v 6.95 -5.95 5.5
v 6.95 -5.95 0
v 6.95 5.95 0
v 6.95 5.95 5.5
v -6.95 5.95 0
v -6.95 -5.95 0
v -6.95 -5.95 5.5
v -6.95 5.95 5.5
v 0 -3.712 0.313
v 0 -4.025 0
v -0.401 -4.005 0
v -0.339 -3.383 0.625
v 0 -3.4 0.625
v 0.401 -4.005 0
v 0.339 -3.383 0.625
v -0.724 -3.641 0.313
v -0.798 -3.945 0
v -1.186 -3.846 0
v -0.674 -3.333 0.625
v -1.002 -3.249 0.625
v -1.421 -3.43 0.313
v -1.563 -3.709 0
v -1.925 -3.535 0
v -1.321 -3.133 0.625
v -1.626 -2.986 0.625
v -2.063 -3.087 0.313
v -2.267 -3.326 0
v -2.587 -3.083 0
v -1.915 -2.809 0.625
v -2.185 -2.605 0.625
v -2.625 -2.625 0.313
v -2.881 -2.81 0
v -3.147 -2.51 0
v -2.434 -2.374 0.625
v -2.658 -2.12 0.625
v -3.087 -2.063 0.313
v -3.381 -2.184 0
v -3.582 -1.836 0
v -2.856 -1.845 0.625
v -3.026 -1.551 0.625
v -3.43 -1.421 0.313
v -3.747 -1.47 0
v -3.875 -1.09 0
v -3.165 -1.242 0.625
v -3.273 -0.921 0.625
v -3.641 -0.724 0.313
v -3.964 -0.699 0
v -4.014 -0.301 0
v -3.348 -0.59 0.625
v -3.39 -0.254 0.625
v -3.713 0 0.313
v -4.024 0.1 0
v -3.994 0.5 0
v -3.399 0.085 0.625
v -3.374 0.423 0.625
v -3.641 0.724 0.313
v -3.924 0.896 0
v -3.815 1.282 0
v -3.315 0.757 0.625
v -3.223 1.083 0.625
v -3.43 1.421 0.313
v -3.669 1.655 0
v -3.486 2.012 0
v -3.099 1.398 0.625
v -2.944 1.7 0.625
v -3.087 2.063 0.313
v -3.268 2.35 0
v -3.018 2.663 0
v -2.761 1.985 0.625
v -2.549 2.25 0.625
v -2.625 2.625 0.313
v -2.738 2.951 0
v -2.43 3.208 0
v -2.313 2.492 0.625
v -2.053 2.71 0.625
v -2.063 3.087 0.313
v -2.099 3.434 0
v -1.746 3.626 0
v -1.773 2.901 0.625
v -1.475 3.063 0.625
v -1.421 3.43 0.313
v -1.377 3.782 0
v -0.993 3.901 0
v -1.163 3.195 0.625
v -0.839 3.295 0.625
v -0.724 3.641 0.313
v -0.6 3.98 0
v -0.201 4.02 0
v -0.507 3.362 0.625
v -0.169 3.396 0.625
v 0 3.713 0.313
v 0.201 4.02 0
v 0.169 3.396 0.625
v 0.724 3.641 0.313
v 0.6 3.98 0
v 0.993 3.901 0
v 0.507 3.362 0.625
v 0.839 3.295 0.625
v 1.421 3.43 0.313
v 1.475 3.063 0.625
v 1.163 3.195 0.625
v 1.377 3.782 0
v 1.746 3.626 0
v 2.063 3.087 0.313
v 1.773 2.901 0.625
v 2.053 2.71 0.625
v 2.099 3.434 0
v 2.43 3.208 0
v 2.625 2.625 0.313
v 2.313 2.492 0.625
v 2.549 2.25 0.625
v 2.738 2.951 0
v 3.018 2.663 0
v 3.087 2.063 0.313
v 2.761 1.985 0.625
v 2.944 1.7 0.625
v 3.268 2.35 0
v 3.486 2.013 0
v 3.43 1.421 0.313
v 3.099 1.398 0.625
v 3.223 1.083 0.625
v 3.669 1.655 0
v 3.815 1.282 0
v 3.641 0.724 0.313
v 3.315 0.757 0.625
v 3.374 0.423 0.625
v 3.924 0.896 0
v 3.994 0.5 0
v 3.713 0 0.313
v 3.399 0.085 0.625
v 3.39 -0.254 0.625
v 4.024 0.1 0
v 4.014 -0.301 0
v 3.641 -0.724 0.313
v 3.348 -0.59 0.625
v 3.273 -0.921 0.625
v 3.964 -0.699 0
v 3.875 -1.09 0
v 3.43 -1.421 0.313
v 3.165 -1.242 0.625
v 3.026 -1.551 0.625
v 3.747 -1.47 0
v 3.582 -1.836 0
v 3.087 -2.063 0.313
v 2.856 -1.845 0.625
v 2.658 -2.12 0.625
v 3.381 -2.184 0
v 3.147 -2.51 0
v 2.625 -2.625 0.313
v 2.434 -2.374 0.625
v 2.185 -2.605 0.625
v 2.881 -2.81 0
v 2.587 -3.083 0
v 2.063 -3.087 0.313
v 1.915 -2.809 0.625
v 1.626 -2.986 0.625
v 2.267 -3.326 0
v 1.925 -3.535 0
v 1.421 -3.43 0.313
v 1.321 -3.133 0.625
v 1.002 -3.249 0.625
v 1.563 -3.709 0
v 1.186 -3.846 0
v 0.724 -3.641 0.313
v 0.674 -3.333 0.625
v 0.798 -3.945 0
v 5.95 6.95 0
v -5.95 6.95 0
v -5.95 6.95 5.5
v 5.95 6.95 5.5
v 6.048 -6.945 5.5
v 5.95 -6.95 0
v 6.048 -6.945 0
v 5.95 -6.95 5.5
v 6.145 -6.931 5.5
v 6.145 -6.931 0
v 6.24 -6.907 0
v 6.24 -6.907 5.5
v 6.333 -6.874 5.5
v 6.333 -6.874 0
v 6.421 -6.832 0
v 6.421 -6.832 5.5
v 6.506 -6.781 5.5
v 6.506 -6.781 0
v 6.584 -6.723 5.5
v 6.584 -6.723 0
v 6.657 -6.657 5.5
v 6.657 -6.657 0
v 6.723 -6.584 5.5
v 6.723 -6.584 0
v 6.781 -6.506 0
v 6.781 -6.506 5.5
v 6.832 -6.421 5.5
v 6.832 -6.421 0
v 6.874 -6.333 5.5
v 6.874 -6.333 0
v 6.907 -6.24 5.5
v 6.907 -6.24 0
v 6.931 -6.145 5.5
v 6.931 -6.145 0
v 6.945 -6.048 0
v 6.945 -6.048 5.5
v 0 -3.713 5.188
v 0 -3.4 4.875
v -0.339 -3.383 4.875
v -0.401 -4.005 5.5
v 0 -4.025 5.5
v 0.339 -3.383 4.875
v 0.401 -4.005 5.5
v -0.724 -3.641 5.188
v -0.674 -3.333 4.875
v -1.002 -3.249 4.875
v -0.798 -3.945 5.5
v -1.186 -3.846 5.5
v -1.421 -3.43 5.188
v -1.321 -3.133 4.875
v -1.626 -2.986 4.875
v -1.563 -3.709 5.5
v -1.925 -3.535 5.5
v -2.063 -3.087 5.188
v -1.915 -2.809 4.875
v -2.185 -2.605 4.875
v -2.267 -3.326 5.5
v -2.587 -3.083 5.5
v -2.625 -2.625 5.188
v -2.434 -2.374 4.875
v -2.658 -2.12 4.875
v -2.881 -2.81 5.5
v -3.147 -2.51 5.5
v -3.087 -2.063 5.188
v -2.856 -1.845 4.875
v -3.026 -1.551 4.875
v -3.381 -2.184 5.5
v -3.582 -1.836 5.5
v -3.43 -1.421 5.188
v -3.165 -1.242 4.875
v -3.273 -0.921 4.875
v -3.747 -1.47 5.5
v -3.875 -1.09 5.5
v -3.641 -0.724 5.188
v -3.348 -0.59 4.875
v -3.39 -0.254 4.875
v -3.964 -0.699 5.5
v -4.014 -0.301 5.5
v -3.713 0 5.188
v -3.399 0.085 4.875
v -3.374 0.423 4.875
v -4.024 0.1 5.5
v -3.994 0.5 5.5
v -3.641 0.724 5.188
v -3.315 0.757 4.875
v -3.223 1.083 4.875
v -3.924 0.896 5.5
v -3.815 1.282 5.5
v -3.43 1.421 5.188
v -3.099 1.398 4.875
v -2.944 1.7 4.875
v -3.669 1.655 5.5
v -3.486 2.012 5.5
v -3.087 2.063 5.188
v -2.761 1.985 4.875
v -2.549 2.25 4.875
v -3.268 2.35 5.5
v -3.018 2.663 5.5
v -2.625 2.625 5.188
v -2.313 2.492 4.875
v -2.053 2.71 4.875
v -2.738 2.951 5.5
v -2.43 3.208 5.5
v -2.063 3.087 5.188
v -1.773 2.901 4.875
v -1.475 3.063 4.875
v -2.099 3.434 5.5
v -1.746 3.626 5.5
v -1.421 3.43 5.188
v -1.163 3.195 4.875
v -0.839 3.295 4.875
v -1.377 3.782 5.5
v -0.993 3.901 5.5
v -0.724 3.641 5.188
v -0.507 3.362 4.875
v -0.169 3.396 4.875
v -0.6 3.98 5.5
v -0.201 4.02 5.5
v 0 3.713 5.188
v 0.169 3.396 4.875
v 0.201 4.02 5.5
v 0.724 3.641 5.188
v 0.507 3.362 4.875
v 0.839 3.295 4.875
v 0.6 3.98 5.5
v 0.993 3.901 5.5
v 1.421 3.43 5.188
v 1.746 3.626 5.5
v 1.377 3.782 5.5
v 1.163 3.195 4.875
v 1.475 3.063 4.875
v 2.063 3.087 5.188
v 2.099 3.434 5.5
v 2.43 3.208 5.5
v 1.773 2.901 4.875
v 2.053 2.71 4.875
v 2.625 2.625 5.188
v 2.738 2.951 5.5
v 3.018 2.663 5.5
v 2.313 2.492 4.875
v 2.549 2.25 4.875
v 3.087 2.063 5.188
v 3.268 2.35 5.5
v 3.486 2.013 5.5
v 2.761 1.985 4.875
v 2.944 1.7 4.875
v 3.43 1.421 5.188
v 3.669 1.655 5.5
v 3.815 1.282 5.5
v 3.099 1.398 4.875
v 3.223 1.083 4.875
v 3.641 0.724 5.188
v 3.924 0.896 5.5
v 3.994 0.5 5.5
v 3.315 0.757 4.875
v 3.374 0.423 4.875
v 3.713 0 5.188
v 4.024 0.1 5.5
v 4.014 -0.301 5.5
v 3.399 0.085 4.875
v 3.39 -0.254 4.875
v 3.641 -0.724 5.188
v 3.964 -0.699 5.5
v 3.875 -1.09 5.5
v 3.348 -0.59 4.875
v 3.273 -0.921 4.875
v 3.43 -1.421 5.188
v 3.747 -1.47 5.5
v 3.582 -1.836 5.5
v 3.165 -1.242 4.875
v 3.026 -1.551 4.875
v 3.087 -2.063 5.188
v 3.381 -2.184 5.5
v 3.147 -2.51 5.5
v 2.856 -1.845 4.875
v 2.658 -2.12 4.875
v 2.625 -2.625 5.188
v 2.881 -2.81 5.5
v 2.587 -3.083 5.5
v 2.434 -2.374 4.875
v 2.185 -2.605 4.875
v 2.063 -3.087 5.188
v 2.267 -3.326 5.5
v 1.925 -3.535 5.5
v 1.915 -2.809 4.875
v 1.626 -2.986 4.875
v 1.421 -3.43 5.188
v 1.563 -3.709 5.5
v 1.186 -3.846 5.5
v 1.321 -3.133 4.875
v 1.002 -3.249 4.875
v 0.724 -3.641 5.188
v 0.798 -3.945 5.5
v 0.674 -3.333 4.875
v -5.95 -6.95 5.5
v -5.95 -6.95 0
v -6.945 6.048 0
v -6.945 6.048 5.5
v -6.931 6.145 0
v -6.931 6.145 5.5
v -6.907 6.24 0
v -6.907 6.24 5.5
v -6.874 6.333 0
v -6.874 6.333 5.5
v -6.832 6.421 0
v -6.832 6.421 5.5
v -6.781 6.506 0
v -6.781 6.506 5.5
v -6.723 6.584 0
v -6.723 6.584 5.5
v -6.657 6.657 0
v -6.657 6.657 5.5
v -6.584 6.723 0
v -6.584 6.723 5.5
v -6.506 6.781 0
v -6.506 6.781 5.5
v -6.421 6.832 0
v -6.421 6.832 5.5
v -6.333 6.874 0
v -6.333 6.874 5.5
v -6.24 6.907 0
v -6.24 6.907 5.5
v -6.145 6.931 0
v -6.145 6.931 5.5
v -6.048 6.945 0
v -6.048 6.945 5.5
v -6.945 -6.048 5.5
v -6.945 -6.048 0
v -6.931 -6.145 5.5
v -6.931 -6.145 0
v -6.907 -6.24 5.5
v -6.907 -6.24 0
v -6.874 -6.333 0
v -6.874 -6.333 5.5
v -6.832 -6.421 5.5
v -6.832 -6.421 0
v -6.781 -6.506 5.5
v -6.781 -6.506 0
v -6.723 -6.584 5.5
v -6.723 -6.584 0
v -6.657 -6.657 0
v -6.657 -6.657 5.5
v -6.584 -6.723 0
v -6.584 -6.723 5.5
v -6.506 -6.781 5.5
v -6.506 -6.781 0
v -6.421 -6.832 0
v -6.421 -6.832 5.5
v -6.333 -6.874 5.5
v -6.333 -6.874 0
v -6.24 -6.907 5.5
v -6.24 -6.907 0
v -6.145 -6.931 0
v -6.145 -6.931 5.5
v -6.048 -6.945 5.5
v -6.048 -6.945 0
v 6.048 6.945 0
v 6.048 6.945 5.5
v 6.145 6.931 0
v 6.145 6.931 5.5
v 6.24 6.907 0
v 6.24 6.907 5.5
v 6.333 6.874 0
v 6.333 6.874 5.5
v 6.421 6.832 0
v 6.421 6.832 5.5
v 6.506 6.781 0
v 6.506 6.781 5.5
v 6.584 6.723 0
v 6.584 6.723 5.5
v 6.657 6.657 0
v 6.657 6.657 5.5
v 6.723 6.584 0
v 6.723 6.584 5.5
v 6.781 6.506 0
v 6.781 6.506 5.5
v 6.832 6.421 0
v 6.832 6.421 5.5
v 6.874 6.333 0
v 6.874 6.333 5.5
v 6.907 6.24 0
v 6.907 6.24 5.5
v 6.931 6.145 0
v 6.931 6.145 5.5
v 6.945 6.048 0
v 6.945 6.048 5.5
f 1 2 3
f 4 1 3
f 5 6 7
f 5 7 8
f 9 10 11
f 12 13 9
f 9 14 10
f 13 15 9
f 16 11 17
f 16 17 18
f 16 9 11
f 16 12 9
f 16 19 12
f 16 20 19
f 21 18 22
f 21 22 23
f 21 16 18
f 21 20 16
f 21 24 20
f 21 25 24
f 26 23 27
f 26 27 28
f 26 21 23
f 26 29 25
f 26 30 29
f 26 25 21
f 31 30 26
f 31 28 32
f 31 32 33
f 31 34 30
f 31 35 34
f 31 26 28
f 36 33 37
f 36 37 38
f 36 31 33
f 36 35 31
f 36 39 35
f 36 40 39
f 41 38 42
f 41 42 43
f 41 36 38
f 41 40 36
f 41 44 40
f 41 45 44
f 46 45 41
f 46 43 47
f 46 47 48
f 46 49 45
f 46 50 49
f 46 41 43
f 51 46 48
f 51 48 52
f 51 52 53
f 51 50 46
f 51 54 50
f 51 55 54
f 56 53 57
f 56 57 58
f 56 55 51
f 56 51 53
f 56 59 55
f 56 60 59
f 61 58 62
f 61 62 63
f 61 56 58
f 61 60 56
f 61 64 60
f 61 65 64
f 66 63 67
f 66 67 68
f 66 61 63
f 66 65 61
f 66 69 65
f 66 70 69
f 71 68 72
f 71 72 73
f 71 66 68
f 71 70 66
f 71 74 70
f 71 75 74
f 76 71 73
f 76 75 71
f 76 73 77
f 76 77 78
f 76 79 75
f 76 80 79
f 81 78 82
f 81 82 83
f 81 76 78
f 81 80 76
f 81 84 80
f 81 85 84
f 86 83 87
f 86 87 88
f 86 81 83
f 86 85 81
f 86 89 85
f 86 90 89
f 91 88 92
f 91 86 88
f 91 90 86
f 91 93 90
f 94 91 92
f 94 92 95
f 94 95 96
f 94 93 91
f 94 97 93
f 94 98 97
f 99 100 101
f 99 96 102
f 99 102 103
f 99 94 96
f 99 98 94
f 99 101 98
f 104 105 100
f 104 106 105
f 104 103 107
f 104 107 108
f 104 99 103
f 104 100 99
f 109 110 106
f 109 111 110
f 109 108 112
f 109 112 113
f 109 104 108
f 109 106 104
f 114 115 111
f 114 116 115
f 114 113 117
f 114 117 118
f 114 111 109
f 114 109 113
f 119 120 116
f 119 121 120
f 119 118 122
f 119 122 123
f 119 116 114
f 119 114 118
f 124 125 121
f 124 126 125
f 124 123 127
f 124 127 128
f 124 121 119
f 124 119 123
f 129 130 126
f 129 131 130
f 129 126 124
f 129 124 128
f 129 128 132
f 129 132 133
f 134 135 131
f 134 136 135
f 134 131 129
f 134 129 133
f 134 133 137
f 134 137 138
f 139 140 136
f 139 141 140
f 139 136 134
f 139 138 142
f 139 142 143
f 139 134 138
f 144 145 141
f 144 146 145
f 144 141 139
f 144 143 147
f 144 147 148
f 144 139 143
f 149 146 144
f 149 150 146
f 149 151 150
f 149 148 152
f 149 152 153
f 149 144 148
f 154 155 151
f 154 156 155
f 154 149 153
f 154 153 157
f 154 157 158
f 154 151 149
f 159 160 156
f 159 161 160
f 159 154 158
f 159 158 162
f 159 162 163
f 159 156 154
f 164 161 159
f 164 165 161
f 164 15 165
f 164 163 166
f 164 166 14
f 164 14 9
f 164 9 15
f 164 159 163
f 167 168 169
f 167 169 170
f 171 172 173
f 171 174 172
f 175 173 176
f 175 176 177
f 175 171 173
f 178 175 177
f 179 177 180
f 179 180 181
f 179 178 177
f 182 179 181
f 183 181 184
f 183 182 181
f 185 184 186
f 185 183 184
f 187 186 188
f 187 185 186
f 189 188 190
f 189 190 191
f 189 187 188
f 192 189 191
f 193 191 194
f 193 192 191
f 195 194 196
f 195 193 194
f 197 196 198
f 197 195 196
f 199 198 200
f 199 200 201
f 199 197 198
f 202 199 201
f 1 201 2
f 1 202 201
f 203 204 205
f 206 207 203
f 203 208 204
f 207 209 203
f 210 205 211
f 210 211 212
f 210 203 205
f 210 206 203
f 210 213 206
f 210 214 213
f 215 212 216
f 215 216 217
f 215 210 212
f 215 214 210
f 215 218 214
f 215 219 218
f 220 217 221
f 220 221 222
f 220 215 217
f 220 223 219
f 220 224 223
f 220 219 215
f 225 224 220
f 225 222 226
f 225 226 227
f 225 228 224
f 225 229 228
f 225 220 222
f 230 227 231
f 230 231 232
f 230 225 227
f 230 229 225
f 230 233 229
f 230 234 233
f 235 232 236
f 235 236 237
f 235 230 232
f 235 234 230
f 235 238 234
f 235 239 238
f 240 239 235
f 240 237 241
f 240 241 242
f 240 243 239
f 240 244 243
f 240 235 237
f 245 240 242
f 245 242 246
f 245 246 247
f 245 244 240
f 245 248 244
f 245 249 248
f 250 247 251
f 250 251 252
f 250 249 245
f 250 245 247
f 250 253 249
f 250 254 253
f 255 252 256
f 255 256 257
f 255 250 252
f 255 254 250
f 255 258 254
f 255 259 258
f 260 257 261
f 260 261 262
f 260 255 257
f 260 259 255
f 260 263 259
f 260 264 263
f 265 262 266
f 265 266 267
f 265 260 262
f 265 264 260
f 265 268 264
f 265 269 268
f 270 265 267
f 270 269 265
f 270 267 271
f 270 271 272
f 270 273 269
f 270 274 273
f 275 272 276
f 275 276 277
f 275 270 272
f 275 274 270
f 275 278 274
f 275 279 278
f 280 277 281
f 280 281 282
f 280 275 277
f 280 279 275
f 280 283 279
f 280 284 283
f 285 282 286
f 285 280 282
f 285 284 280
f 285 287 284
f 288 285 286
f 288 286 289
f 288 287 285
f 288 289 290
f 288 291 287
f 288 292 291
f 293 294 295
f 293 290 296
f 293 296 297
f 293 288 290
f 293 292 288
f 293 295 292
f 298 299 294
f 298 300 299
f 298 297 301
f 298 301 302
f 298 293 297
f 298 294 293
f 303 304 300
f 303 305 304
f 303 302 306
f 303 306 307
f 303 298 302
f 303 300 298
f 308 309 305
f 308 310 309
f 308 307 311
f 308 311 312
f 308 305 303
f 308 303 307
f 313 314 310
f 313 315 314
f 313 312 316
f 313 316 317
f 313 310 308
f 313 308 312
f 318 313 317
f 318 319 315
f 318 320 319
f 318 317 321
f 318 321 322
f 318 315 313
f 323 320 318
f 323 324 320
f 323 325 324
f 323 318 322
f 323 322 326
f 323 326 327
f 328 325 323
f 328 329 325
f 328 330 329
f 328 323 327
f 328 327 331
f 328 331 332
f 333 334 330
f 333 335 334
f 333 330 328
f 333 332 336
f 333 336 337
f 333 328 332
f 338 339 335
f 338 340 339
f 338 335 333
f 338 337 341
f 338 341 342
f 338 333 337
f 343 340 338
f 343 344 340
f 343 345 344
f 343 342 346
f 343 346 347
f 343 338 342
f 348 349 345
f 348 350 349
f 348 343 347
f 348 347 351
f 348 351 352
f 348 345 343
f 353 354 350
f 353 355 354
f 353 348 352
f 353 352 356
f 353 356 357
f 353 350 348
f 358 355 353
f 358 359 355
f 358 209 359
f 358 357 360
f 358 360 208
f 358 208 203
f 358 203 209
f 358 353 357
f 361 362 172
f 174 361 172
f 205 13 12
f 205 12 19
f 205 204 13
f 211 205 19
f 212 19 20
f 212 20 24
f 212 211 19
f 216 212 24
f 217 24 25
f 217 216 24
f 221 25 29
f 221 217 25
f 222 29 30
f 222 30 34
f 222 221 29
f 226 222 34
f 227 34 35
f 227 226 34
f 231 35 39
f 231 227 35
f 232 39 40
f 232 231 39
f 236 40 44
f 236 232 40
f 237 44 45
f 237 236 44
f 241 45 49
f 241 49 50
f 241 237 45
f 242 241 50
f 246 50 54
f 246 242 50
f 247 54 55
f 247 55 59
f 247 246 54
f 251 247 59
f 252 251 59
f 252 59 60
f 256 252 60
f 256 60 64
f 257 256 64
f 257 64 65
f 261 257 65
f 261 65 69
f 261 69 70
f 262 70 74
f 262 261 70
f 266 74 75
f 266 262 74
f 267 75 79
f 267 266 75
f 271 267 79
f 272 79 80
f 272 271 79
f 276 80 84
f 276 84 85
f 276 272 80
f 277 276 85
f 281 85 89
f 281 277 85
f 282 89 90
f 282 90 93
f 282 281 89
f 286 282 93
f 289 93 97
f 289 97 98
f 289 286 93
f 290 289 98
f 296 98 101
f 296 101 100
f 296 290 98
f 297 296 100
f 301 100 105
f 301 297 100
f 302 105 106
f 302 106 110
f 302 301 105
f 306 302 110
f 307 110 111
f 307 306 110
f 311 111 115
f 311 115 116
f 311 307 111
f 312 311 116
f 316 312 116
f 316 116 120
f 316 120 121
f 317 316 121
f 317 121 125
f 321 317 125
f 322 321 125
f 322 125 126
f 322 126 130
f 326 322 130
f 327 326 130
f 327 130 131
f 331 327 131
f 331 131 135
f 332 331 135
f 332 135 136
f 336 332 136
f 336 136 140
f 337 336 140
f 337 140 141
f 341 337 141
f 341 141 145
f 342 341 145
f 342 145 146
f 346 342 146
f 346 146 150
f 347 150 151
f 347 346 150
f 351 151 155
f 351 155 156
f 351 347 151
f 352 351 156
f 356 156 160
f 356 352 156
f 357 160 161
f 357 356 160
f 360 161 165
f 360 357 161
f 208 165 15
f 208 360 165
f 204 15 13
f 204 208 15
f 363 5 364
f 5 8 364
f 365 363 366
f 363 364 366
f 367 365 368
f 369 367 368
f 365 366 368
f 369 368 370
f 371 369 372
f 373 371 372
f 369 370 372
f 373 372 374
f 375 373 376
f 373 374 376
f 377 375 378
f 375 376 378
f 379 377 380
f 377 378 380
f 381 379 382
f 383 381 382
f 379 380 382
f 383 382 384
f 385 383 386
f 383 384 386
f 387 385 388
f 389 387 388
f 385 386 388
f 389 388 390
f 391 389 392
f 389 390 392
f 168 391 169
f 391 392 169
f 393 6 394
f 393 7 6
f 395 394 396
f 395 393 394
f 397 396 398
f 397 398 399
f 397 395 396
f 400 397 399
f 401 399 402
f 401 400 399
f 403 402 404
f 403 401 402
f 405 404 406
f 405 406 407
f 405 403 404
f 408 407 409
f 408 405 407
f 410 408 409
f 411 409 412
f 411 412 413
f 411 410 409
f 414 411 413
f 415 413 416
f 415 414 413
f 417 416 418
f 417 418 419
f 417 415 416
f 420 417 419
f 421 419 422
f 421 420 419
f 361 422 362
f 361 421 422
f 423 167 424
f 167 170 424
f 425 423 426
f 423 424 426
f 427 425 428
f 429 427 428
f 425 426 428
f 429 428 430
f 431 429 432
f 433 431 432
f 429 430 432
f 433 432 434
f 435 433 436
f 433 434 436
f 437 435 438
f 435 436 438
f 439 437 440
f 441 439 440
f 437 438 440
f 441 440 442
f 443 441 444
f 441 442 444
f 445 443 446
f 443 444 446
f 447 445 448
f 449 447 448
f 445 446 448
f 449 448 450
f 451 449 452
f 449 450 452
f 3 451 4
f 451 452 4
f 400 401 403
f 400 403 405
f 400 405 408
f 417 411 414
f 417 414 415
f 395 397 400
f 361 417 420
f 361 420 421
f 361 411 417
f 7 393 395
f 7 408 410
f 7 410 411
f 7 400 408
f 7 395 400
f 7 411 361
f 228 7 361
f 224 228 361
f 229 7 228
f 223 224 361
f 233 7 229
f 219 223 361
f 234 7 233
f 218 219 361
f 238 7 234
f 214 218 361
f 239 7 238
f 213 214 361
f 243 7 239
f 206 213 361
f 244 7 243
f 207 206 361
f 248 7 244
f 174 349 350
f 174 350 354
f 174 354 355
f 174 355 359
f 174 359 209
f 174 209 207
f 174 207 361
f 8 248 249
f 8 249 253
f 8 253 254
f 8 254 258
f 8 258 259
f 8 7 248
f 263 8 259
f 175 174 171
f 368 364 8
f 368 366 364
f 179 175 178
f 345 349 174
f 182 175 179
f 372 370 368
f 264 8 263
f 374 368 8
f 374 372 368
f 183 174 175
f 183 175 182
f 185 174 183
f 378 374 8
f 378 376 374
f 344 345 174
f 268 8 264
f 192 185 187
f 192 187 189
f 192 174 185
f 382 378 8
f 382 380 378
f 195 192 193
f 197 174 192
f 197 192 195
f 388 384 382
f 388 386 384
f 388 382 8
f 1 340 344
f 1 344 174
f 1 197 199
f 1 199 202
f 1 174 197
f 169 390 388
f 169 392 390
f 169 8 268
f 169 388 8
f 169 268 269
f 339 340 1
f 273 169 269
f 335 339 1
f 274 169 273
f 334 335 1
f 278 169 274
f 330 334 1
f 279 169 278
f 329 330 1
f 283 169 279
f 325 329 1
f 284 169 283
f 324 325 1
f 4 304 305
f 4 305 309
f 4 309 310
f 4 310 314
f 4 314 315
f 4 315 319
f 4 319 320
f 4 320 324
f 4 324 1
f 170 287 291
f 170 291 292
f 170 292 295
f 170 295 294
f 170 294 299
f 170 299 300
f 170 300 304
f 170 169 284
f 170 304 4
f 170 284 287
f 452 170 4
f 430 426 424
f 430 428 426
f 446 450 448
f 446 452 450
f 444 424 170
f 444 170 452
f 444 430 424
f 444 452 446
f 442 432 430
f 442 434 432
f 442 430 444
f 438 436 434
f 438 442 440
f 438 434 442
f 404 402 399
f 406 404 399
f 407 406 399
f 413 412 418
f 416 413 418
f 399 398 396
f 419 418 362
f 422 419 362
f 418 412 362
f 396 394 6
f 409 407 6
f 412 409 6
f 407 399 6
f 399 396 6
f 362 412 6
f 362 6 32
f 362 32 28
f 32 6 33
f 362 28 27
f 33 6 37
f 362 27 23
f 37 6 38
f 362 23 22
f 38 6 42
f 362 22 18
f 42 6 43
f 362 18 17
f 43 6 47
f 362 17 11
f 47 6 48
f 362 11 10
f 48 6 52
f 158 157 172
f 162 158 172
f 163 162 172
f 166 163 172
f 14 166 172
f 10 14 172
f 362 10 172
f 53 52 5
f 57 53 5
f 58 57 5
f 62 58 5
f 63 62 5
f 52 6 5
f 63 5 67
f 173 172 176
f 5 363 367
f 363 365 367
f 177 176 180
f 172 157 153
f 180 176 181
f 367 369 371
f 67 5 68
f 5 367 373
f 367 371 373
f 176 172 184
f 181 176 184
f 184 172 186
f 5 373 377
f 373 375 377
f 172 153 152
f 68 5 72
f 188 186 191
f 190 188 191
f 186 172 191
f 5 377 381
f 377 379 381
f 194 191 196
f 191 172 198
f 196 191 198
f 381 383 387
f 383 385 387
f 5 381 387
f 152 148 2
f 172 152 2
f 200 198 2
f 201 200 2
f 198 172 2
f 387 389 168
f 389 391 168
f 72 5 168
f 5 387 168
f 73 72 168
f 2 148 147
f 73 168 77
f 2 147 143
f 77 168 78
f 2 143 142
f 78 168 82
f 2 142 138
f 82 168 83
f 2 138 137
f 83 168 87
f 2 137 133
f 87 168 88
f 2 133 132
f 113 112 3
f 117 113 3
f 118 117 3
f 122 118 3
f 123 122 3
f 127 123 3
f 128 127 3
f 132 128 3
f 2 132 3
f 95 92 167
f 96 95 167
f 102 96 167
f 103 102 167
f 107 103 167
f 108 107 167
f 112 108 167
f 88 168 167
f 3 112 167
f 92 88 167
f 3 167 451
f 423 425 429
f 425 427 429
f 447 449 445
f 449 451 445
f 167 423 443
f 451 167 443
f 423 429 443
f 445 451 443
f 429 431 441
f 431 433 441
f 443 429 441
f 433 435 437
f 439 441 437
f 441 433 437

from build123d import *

# Parameters (mm, degrees)
SKETCH_1_W      = 13.9
SKETCH_1_H      = 13.9
EXTRUDE_1_DEPTH = 5.5
FILLET_1_R      = 1


with BuildPart() as part:
    # Эскиз1 → Бобышка-Вытянуть1 (new body)
    with BuildSketch(Plane.XY):
        Rectangle(SKETCH_1_W, SKETCH_1_H)
    extrude(amount=EXTRUDE_1_DEPTH)

    # Эскиз3 → Отверстие обработанное метчиком M81 (revolve, cut)
    with BuildSketch(Plane(origin=(0, 0, 5.5), x_dir=(0, -1, 0), z_dir=(1, 0, 0))):
        Polygon((0, 0), (0, 5.5), (4.025, 5.5), (3.4, 4.875), (3.4, 0.625), (4.025, 0), align=None)
    revolve(axis=Axis((0, 0, 11.85), (0, 0, -1)), mode=Mode.SUBTRACT)

    # Скругление1
    fillet_1_edges = [part.edges().sort_by_distance(p)[0] for p in [
        (6.95, -6.95, 2.75),
        (-6.95, -6.95, 2.75),
        (-6.95, 6.95, 2.75),
        (6.95, 6.95, 2.75),
    ]]
    fillet(fillet_1_edges, radius=FILLET_1_R)


solid = part.part
